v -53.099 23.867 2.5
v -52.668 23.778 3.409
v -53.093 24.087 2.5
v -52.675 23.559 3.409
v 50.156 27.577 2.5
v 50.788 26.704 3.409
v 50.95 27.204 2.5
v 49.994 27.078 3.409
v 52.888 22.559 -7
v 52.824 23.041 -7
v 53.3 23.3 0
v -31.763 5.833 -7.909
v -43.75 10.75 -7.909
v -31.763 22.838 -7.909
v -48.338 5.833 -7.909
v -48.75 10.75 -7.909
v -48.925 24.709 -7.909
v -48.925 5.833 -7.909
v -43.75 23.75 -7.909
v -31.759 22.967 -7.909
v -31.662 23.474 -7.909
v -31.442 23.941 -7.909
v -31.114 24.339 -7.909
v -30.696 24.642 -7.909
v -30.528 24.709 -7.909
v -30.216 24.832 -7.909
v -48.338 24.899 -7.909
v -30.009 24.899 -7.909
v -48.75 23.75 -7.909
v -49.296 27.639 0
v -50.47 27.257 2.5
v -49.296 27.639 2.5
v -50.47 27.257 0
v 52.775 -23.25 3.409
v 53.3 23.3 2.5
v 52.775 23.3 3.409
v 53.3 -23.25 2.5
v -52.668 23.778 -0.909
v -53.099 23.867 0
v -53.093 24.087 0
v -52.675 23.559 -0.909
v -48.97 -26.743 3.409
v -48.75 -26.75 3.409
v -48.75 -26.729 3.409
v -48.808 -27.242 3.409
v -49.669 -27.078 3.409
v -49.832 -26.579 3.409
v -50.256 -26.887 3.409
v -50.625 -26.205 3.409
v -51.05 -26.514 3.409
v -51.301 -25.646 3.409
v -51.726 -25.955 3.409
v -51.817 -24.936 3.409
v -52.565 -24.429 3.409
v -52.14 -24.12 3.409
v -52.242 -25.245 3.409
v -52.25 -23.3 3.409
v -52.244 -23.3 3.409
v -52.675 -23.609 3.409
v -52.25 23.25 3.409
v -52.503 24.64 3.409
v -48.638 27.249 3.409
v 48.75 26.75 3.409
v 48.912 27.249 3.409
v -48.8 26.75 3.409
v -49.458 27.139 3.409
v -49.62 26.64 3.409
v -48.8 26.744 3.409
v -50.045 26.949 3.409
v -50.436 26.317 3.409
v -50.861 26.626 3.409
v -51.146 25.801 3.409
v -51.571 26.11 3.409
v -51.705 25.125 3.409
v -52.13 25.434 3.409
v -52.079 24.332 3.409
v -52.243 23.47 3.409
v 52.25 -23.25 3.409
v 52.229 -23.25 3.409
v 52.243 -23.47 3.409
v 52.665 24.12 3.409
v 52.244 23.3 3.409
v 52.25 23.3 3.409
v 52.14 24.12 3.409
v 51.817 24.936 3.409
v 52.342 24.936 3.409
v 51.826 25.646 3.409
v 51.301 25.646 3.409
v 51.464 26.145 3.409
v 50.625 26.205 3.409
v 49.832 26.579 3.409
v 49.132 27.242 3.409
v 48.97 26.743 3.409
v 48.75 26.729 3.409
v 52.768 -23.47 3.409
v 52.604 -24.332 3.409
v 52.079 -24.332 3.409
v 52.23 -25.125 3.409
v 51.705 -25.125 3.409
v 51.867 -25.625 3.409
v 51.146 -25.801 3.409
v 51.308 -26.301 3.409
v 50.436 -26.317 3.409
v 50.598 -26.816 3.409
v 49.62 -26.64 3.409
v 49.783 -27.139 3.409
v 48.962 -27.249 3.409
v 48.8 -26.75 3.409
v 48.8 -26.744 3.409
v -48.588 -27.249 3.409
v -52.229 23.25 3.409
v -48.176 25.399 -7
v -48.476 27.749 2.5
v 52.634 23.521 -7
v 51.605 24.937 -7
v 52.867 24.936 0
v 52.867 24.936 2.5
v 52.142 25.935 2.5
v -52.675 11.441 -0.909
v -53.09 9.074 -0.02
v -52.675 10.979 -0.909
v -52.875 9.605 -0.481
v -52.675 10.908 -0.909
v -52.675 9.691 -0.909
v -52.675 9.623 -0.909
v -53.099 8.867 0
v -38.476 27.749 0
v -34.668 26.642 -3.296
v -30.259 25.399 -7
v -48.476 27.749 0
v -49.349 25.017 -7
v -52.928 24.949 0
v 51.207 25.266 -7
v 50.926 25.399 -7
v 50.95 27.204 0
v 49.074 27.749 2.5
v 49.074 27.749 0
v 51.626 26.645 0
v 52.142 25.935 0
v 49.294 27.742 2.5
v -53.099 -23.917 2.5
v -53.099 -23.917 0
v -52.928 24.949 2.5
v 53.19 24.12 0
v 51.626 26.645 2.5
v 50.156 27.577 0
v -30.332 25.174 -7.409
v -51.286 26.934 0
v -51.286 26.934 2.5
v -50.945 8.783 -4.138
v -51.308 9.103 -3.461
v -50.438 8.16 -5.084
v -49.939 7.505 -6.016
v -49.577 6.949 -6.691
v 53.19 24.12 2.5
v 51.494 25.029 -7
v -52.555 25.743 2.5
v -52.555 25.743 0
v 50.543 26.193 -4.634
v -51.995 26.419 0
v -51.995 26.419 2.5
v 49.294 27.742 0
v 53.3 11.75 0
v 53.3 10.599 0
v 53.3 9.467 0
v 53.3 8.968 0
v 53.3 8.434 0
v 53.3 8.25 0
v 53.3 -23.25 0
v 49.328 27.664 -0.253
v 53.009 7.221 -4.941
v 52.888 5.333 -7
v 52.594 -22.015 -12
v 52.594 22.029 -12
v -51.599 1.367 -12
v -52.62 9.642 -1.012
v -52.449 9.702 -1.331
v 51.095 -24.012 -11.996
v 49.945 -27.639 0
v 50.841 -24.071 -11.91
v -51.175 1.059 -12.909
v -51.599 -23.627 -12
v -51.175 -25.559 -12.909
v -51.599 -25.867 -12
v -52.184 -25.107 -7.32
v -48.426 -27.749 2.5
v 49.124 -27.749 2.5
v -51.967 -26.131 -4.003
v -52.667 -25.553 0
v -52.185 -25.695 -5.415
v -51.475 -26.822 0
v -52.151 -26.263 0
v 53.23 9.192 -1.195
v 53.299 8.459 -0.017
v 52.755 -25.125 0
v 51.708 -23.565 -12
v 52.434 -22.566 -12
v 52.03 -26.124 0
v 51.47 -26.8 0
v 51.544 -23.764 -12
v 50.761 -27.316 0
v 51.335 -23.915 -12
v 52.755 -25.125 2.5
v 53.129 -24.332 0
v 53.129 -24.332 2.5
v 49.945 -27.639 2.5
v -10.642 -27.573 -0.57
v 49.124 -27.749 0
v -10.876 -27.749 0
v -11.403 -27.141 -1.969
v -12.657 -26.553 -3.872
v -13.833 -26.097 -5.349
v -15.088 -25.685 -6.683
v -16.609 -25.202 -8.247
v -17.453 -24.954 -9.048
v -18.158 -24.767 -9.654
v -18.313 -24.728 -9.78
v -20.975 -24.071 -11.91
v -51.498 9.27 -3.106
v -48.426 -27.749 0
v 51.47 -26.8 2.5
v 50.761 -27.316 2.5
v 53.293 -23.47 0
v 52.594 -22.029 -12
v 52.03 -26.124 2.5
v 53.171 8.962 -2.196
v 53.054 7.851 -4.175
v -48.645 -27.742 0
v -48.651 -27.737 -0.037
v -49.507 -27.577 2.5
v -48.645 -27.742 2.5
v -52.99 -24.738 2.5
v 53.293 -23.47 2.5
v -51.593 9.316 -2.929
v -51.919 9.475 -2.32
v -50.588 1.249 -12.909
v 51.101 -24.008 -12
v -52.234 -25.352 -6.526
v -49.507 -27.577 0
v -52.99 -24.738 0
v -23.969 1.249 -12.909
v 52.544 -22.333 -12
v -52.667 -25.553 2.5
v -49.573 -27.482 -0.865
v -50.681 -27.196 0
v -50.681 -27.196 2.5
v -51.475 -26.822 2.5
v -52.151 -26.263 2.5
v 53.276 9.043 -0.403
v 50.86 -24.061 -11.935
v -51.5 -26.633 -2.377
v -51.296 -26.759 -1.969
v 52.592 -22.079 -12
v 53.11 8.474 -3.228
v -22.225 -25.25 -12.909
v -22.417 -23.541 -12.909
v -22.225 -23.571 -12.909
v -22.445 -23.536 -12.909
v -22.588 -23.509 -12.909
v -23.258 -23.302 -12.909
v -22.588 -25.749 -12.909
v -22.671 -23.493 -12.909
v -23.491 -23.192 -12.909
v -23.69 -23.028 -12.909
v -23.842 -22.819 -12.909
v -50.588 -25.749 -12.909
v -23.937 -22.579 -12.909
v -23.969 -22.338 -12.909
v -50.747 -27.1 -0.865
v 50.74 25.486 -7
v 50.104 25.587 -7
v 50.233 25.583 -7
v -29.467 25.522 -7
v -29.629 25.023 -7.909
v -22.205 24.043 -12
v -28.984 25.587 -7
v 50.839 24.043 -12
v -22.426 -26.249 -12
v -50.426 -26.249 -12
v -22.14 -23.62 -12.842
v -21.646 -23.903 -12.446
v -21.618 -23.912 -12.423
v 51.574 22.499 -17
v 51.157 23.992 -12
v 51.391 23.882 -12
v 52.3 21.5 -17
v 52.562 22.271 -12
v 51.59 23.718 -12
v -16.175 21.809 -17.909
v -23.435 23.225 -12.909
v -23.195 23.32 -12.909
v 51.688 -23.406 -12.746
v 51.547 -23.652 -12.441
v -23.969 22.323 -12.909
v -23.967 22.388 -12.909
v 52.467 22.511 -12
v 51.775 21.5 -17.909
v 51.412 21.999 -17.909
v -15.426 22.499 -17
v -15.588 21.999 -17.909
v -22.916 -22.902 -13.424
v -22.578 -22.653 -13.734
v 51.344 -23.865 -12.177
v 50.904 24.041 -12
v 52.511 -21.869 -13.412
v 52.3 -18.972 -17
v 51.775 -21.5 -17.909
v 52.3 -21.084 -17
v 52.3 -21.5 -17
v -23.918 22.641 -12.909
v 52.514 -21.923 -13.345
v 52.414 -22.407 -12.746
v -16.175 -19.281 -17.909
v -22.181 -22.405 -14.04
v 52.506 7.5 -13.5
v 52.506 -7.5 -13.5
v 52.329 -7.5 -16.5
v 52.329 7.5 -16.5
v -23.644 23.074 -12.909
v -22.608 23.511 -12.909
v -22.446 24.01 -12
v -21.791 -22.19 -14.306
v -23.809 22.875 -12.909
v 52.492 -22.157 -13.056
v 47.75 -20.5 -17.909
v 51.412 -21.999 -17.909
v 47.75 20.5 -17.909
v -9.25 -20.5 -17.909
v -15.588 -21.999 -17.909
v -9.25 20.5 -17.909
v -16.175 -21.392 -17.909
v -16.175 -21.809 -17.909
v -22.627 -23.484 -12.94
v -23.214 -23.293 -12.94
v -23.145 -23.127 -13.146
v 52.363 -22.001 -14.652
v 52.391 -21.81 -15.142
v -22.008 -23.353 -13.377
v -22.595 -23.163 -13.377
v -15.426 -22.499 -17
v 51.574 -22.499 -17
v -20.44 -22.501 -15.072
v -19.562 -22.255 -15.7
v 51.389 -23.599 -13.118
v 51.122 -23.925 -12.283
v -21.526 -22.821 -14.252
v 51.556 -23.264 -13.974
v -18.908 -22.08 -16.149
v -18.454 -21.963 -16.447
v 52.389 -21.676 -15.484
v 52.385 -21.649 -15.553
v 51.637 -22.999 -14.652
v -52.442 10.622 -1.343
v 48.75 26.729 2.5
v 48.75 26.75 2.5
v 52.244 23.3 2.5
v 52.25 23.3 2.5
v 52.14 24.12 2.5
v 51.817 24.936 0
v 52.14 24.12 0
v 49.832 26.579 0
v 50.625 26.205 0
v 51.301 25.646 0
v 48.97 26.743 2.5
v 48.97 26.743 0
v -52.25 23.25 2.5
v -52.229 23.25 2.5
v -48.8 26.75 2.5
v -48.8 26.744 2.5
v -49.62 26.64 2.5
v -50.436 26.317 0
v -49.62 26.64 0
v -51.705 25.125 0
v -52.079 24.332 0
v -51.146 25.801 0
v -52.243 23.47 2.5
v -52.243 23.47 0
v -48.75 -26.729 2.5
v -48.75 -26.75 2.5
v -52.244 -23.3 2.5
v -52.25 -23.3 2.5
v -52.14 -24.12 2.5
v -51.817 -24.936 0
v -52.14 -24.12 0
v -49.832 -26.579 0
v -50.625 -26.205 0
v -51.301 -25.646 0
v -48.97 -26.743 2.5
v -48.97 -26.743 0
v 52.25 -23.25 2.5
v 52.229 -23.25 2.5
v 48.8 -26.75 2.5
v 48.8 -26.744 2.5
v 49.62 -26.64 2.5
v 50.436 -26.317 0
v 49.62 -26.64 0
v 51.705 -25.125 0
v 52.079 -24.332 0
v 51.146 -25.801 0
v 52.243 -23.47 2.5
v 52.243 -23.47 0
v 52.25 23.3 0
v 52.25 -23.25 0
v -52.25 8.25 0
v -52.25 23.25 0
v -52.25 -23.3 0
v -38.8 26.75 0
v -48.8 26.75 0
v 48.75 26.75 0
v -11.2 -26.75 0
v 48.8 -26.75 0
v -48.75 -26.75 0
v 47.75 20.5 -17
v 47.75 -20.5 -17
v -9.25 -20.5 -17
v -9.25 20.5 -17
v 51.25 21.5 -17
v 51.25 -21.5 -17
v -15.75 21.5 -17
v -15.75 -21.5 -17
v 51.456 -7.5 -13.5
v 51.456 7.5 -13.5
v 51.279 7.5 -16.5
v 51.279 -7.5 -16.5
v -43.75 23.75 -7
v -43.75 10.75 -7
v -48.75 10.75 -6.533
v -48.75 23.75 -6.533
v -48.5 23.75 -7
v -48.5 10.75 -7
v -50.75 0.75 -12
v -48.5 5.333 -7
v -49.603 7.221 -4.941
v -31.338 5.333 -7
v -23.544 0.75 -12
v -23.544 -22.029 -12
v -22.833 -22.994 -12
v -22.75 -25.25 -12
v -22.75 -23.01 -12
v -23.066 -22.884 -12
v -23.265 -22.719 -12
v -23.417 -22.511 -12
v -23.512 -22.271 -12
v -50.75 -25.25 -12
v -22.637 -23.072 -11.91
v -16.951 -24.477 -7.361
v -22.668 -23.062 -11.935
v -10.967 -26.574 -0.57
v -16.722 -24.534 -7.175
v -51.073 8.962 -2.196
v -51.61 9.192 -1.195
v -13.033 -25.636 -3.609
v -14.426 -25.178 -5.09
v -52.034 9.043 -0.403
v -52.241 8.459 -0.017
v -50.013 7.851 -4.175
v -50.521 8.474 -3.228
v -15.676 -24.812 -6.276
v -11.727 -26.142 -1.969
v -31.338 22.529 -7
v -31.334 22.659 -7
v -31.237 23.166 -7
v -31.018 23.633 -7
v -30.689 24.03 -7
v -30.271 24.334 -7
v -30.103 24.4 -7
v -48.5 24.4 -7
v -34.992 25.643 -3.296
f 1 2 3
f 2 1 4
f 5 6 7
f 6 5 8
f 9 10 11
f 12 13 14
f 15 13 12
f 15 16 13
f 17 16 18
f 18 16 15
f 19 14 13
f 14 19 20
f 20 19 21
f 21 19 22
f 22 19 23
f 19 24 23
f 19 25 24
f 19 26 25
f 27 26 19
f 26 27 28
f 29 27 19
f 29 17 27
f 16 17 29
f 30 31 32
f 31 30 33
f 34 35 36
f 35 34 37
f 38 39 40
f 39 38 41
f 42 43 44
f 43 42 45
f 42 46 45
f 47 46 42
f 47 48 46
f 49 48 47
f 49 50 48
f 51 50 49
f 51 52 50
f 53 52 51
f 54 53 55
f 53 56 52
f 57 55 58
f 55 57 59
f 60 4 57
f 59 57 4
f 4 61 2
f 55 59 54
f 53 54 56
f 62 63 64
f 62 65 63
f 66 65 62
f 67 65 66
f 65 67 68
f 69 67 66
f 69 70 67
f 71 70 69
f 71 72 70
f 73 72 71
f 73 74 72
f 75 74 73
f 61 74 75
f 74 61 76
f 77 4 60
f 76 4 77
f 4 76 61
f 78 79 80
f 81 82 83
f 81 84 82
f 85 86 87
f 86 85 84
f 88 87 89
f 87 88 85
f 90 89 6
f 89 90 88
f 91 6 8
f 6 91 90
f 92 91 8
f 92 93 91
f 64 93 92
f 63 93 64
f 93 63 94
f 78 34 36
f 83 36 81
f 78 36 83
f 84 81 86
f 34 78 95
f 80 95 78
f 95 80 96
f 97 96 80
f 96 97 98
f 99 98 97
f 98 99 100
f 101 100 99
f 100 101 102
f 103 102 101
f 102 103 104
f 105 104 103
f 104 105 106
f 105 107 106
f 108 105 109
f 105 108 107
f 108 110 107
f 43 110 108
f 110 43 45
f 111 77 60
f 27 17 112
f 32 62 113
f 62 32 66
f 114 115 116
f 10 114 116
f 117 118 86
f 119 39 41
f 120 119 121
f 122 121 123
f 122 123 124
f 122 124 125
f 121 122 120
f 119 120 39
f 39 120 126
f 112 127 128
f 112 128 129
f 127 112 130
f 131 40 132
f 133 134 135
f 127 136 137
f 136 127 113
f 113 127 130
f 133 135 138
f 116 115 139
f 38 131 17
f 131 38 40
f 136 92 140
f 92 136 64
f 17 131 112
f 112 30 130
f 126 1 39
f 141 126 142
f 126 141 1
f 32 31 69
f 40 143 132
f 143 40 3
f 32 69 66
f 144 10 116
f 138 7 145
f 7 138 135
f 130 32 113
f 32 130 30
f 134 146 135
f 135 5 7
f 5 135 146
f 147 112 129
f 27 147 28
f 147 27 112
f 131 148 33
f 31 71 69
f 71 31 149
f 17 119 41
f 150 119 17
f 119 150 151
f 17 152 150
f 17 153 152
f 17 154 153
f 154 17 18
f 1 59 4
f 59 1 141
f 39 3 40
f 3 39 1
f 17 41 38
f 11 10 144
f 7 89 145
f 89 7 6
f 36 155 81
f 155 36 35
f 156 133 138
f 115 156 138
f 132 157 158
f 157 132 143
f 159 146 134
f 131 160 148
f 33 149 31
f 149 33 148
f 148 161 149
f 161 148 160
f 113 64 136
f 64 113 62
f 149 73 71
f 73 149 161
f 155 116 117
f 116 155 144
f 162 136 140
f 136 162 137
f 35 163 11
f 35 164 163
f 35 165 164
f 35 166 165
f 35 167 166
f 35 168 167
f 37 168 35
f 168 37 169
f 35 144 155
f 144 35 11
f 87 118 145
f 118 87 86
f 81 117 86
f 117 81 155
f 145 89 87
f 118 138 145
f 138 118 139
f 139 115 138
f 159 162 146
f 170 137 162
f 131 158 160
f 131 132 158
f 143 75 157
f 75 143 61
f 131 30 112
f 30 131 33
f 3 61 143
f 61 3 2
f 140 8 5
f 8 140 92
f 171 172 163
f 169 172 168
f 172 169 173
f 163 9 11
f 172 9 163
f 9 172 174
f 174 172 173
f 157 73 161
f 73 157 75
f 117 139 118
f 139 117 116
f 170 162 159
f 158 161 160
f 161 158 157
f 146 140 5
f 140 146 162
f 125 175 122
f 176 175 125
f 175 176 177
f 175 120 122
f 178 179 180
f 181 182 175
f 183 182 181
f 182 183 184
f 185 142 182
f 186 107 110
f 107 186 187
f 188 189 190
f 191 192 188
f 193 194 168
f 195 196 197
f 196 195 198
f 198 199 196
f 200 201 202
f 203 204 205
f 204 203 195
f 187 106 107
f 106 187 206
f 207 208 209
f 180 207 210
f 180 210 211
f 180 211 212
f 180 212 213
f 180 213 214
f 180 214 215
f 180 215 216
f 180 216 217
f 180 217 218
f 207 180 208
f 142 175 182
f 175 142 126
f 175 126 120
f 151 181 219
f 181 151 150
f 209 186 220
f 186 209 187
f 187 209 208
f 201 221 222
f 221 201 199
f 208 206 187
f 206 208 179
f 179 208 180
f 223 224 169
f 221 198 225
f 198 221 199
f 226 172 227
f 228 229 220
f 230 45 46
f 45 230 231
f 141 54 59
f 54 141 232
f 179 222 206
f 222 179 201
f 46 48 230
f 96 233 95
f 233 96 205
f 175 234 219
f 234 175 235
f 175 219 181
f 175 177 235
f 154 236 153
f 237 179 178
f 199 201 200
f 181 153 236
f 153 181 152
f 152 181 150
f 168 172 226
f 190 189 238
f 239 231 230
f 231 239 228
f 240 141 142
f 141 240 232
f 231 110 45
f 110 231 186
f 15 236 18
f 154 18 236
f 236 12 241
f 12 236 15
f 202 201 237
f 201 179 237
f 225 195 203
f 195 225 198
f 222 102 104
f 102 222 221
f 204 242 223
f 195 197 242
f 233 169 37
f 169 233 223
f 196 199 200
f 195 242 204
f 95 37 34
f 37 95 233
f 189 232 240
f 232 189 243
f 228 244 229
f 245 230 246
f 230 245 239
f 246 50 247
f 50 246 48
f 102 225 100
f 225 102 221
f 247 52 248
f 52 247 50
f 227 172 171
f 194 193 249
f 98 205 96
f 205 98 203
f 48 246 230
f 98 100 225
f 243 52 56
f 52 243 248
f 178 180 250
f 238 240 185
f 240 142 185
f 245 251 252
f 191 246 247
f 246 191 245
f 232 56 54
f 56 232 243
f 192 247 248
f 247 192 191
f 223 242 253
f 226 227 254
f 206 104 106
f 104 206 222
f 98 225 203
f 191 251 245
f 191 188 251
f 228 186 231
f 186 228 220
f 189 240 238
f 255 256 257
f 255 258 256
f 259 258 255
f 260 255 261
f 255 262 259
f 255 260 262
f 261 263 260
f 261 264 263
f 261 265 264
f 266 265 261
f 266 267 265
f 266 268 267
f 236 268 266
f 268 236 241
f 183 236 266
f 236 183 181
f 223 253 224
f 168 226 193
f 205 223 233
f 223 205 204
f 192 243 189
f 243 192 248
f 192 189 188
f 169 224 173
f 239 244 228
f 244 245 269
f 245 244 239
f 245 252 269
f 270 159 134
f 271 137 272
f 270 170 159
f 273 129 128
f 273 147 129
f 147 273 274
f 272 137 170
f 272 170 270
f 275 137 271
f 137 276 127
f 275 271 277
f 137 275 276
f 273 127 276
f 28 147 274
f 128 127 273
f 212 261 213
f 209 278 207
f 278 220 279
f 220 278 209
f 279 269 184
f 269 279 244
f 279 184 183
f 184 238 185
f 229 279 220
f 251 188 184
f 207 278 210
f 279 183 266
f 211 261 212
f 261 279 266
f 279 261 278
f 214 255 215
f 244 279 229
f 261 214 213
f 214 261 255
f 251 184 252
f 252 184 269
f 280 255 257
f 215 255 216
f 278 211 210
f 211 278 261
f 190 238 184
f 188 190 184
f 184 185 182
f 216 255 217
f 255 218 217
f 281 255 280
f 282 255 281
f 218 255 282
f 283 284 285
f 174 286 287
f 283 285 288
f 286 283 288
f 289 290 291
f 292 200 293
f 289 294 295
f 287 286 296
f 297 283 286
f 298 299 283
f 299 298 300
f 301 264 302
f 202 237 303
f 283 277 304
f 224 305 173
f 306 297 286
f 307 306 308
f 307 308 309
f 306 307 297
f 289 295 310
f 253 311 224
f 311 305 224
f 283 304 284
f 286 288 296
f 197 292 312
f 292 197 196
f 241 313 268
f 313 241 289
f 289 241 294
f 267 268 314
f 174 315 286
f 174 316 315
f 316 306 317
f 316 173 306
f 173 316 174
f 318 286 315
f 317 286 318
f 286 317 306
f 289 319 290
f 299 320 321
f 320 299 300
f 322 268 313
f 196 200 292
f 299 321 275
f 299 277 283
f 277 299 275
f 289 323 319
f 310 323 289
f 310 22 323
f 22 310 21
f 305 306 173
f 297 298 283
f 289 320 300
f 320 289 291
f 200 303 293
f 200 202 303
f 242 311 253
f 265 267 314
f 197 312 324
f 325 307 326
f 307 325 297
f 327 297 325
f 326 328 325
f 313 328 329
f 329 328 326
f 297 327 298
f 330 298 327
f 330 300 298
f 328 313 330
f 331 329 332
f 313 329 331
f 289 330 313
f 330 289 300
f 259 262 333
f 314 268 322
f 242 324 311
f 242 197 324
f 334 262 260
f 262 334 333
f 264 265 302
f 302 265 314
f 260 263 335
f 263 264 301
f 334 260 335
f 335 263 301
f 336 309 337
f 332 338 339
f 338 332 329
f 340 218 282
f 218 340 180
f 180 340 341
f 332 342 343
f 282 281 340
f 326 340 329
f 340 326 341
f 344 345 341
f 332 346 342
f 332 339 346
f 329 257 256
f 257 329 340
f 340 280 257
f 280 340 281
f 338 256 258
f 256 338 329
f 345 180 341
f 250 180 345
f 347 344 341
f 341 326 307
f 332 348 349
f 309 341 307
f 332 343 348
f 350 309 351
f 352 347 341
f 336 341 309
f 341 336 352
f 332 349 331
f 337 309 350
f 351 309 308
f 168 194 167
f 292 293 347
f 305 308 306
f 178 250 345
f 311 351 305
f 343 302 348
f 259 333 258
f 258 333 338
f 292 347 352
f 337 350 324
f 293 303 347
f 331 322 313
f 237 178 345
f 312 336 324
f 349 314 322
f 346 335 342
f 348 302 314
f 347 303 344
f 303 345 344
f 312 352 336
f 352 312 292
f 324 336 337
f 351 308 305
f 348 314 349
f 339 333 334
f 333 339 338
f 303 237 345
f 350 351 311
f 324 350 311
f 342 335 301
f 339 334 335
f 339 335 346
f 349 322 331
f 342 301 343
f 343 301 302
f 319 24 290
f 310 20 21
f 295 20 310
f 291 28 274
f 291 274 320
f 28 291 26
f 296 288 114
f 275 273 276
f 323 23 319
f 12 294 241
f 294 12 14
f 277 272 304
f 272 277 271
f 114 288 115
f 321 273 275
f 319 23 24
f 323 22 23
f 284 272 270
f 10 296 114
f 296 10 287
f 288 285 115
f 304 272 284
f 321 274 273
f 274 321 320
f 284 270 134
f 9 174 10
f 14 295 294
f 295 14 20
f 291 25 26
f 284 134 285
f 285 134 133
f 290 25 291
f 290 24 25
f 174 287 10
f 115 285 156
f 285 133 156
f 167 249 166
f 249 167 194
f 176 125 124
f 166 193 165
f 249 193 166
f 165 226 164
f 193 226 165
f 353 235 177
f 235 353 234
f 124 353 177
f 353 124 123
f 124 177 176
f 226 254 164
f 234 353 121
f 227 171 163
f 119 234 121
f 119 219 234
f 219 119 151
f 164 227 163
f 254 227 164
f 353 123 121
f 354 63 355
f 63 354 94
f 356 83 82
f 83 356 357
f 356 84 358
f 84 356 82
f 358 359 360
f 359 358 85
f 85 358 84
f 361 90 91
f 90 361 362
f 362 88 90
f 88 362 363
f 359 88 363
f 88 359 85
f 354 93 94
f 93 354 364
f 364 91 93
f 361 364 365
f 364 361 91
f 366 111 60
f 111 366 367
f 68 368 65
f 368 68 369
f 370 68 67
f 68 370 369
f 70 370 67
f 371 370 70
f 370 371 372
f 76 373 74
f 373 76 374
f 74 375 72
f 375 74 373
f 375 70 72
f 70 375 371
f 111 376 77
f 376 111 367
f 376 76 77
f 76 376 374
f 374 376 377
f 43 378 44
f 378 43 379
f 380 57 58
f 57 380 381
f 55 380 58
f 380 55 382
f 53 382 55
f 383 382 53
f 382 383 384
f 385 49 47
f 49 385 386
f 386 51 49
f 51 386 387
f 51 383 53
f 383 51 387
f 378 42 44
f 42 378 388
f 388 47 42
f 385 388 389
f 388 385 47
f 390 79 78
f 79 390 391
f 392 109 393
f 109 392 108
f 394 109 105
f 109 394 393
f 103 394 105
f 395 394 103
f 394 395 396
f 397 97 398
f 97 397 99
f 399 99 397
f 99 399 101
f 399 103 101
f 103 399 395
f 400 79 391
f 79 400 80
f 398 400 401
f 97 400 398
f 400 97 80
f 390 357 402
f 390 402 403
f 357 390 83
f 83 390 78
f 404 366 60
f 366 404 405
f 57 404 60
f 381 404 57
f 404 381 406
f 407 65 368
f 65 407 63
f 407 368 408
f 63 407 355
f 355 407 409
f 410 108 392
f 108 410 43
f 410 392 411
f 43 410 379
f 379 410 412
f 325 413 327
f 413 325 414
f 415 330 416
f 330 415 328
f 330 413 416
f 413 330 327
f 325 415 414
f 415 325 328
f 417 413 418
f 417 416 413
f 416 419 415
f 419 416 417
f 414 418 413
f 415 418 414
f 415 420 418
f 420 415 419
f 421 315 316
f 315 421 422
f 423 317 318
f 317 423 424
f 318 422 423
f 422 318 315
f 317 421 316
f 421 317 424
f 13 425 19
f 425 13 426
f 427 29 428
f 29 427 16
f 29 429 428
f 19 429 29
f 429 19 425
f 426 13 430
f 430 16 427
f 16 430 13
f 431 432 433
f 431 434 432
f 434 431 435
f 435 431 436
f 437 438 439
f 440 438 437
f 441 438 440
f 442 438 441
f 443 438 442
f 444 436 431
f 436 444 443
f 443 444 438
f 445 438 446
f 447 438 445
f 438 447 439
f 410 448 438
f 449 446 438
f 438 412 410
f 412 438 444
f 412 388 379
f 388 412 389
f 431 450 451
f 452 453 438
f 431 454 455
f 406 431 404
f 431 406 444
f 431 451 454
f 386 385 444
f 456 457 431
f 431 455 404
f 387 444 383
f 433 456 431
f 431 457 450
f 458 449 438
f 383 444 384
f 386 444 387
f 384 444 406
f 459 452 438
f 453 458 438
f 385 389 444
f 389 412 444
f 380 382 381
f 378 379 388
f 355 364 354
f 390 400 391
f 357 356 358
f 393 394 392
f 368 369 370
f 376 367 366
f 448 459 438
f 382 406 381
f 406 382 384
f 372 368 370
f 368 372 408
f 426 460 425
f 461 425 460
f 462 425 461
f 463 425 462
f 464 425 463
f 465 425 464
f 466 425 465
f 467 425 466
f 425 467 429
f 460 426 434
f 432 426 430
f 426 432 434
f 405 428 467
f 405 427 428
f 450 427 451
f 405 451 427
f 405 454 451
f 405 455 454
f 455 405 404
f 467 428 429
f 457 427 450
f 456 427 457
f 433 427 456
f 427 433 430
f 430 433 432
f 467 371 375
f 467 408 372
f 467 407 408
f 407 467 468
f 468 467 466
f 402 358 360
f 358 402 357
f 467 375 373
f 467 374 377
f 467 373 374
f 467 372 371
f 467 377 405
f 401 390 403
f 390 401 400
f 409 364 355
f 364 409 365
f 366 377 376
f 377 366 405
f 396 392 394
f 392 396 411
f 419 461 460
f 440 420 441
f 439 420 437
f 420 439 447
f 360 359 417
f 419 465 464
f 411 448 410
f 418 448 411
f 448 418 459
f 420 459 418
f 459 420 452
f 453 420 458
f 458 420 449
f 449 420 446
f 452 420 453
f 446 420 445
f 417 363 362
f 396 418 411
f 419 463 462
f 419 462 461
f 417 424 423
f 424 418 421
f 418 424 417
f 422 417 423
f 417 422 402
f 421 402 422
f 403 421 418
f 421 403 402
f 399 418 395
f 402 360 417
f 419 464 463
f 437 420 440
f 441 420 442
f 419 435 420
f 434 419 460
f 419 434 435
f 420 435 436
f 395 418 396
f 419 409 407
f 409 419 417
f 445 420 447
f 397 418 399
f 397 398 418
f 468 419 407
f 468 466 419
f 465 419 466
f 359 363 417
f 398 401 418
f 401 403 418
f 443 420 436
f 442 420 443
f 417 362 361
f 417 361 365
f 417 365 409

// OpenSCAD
epaisseur1=1.5;
radius=2;
xc=101.5;
yc=50.5;
xb=xc+2*epaisseur1;
yb=yc+2*epaisseur1;
offset=4.5;
//voffset = .75;
rebord = 2.5;
epaisseur=1.2;
marge_ba=1.2;
hecran=57;



difference () {

// coque de base
minkowski () {
union () {
// cube de coque (ecran)
hull() {
    
// PCB ecran
translate([xc/2-(hecran+4.5+5.5)/2+0.5,0,-17/2])
cube([hecran+4.5+5.5, 41+2, 17], center = true);

// socle ecran
translate([(4.5+5.5)/2,0,rebord / 2])
roundCornersCube(xb-(4.5+5.5),yb,rebord,radius+epaisseur1);

}

hull () {

// GPS
translate([-xc/2+28/2,-yc/2+26/2,-(12)/2])
cube([28, 26, 12], center = true);
    
// boite ecran
translate([-60/2,-15/2,rebord / 2])
roundCornersCube(xb-60,yb-15,rebord,radius+epaisseur1);
    
}

hull () {
  // Inter
  translate([-xc/2+40/2+4.5/2,yc/2-20/2-1.7/2,-7/2])
  cube([40, 20, 7], center = true);
    
  translate([0,0,rebord / 2])
  roundCornersCube(xb,yb,rebord,radius+epaisseur1);

}
}
sphere(1.05, center = true);
}

// ceci est la box inferieure (exterieur)
translate([0,0,25+marge_ba])
roundCornersCube(xb,yb,50,radius+epaisseur1);

// ceci est l'ecran
translate([xb/2-57/2-offset,0,-2])
cube([57, 41, 100], center = true);
// PCB ecran
translate([xc/2-(hecran+4.5+5.5)/2+0.5,0,-17/2])
cube([hecran+4.5+5.5, 41+2, 17], center = true);

// ceci est la SD
translate([xb/2,0,-1.5-13.5])
cube([20, 15, 3], center = true);

// Inter
translate([-xc/2+5/2+4/2,yc/2-13/2-3/2,-15])
cube([5, 13, 30], center = true);


hull () {

// GPS
translate([-xc/2+28/2,-yc/2+26/2,-(12)/2])
cube([28, 26, 12], center = true);
    
// boite ecran
translate([-60/2,-15/2,rebord / 2])
roundCornersCube(xb-60,yb-15,rebord,radius+epaisseur1);
    
}

hull () {
  // Inter
  translate([-xc/2+40/2+4.5/2,yc/2-20/2-1.7/2,-7/2])
  cube([40, 20, 7], center = true);
    
  translate([0,0,rebord / 2])
  roundCornersCube(xb,yb,rebord,radius+epaisseur1);

}

hull() {
    
// PCB ecran
translate([xc/2-(hecran+4.5+5.5)/2+0.5,0,-17/2])
cube([hecran+4.5+5.5, 41+2, 17], center = true);

// socle ecran
translate([10/2,0,rebord / 2])
roundCornersCube(xb-10,yb,rebord,radius+epaisseur1);

}

}

/////////////////////////////////
/////////////////////////////////
/////////////////////////////////
/////////////////////////////////

module createMeniscus(h,radius) // This module creates the shape that needs to be substracted from a cube to make its corners rounded.
difference(){        //This shape is basicly the difference between a quarter of cylinder and a cube
   translate([radius/2+0.1,radius/2+0.1,0]){
      cube([radius+0.2,radius+0.1,h+0.2],center=true);         // All that 0.x numbers are to avoid "ghost boundaries" when substracting
   }

   cylinder(h=h+0.2,r=radius,$fn = 25,center=true);
}


module roundCornersCube(x,y,z,r)  // Now we just substract the shape we have created in the four corners
difference(){
   cube([x,y,z], center=true);

translate([x/2-r,y/2-r]){  // We move to the first corner (x,y)
      rotate(0){  
         createMeniscus(z,r); // And substract the meniscus
      }
   }
   translate([-x/2+r,y/2-r]){ // To the second corner (-x,y)
      rotate(90){
         createMeniscus(z,r); // But this time we have to rotate the meniscus 90 deg
      }
   }
      translate([-x/2+r,-y/2+r]){ // ... 
      rotate(180){
         createMeniscus(z,r);
      }
   }
      translate([x/2-r,-y/2+r]){
      rotate(270){
         createMeniscus(z,r);
      }
   }
}
